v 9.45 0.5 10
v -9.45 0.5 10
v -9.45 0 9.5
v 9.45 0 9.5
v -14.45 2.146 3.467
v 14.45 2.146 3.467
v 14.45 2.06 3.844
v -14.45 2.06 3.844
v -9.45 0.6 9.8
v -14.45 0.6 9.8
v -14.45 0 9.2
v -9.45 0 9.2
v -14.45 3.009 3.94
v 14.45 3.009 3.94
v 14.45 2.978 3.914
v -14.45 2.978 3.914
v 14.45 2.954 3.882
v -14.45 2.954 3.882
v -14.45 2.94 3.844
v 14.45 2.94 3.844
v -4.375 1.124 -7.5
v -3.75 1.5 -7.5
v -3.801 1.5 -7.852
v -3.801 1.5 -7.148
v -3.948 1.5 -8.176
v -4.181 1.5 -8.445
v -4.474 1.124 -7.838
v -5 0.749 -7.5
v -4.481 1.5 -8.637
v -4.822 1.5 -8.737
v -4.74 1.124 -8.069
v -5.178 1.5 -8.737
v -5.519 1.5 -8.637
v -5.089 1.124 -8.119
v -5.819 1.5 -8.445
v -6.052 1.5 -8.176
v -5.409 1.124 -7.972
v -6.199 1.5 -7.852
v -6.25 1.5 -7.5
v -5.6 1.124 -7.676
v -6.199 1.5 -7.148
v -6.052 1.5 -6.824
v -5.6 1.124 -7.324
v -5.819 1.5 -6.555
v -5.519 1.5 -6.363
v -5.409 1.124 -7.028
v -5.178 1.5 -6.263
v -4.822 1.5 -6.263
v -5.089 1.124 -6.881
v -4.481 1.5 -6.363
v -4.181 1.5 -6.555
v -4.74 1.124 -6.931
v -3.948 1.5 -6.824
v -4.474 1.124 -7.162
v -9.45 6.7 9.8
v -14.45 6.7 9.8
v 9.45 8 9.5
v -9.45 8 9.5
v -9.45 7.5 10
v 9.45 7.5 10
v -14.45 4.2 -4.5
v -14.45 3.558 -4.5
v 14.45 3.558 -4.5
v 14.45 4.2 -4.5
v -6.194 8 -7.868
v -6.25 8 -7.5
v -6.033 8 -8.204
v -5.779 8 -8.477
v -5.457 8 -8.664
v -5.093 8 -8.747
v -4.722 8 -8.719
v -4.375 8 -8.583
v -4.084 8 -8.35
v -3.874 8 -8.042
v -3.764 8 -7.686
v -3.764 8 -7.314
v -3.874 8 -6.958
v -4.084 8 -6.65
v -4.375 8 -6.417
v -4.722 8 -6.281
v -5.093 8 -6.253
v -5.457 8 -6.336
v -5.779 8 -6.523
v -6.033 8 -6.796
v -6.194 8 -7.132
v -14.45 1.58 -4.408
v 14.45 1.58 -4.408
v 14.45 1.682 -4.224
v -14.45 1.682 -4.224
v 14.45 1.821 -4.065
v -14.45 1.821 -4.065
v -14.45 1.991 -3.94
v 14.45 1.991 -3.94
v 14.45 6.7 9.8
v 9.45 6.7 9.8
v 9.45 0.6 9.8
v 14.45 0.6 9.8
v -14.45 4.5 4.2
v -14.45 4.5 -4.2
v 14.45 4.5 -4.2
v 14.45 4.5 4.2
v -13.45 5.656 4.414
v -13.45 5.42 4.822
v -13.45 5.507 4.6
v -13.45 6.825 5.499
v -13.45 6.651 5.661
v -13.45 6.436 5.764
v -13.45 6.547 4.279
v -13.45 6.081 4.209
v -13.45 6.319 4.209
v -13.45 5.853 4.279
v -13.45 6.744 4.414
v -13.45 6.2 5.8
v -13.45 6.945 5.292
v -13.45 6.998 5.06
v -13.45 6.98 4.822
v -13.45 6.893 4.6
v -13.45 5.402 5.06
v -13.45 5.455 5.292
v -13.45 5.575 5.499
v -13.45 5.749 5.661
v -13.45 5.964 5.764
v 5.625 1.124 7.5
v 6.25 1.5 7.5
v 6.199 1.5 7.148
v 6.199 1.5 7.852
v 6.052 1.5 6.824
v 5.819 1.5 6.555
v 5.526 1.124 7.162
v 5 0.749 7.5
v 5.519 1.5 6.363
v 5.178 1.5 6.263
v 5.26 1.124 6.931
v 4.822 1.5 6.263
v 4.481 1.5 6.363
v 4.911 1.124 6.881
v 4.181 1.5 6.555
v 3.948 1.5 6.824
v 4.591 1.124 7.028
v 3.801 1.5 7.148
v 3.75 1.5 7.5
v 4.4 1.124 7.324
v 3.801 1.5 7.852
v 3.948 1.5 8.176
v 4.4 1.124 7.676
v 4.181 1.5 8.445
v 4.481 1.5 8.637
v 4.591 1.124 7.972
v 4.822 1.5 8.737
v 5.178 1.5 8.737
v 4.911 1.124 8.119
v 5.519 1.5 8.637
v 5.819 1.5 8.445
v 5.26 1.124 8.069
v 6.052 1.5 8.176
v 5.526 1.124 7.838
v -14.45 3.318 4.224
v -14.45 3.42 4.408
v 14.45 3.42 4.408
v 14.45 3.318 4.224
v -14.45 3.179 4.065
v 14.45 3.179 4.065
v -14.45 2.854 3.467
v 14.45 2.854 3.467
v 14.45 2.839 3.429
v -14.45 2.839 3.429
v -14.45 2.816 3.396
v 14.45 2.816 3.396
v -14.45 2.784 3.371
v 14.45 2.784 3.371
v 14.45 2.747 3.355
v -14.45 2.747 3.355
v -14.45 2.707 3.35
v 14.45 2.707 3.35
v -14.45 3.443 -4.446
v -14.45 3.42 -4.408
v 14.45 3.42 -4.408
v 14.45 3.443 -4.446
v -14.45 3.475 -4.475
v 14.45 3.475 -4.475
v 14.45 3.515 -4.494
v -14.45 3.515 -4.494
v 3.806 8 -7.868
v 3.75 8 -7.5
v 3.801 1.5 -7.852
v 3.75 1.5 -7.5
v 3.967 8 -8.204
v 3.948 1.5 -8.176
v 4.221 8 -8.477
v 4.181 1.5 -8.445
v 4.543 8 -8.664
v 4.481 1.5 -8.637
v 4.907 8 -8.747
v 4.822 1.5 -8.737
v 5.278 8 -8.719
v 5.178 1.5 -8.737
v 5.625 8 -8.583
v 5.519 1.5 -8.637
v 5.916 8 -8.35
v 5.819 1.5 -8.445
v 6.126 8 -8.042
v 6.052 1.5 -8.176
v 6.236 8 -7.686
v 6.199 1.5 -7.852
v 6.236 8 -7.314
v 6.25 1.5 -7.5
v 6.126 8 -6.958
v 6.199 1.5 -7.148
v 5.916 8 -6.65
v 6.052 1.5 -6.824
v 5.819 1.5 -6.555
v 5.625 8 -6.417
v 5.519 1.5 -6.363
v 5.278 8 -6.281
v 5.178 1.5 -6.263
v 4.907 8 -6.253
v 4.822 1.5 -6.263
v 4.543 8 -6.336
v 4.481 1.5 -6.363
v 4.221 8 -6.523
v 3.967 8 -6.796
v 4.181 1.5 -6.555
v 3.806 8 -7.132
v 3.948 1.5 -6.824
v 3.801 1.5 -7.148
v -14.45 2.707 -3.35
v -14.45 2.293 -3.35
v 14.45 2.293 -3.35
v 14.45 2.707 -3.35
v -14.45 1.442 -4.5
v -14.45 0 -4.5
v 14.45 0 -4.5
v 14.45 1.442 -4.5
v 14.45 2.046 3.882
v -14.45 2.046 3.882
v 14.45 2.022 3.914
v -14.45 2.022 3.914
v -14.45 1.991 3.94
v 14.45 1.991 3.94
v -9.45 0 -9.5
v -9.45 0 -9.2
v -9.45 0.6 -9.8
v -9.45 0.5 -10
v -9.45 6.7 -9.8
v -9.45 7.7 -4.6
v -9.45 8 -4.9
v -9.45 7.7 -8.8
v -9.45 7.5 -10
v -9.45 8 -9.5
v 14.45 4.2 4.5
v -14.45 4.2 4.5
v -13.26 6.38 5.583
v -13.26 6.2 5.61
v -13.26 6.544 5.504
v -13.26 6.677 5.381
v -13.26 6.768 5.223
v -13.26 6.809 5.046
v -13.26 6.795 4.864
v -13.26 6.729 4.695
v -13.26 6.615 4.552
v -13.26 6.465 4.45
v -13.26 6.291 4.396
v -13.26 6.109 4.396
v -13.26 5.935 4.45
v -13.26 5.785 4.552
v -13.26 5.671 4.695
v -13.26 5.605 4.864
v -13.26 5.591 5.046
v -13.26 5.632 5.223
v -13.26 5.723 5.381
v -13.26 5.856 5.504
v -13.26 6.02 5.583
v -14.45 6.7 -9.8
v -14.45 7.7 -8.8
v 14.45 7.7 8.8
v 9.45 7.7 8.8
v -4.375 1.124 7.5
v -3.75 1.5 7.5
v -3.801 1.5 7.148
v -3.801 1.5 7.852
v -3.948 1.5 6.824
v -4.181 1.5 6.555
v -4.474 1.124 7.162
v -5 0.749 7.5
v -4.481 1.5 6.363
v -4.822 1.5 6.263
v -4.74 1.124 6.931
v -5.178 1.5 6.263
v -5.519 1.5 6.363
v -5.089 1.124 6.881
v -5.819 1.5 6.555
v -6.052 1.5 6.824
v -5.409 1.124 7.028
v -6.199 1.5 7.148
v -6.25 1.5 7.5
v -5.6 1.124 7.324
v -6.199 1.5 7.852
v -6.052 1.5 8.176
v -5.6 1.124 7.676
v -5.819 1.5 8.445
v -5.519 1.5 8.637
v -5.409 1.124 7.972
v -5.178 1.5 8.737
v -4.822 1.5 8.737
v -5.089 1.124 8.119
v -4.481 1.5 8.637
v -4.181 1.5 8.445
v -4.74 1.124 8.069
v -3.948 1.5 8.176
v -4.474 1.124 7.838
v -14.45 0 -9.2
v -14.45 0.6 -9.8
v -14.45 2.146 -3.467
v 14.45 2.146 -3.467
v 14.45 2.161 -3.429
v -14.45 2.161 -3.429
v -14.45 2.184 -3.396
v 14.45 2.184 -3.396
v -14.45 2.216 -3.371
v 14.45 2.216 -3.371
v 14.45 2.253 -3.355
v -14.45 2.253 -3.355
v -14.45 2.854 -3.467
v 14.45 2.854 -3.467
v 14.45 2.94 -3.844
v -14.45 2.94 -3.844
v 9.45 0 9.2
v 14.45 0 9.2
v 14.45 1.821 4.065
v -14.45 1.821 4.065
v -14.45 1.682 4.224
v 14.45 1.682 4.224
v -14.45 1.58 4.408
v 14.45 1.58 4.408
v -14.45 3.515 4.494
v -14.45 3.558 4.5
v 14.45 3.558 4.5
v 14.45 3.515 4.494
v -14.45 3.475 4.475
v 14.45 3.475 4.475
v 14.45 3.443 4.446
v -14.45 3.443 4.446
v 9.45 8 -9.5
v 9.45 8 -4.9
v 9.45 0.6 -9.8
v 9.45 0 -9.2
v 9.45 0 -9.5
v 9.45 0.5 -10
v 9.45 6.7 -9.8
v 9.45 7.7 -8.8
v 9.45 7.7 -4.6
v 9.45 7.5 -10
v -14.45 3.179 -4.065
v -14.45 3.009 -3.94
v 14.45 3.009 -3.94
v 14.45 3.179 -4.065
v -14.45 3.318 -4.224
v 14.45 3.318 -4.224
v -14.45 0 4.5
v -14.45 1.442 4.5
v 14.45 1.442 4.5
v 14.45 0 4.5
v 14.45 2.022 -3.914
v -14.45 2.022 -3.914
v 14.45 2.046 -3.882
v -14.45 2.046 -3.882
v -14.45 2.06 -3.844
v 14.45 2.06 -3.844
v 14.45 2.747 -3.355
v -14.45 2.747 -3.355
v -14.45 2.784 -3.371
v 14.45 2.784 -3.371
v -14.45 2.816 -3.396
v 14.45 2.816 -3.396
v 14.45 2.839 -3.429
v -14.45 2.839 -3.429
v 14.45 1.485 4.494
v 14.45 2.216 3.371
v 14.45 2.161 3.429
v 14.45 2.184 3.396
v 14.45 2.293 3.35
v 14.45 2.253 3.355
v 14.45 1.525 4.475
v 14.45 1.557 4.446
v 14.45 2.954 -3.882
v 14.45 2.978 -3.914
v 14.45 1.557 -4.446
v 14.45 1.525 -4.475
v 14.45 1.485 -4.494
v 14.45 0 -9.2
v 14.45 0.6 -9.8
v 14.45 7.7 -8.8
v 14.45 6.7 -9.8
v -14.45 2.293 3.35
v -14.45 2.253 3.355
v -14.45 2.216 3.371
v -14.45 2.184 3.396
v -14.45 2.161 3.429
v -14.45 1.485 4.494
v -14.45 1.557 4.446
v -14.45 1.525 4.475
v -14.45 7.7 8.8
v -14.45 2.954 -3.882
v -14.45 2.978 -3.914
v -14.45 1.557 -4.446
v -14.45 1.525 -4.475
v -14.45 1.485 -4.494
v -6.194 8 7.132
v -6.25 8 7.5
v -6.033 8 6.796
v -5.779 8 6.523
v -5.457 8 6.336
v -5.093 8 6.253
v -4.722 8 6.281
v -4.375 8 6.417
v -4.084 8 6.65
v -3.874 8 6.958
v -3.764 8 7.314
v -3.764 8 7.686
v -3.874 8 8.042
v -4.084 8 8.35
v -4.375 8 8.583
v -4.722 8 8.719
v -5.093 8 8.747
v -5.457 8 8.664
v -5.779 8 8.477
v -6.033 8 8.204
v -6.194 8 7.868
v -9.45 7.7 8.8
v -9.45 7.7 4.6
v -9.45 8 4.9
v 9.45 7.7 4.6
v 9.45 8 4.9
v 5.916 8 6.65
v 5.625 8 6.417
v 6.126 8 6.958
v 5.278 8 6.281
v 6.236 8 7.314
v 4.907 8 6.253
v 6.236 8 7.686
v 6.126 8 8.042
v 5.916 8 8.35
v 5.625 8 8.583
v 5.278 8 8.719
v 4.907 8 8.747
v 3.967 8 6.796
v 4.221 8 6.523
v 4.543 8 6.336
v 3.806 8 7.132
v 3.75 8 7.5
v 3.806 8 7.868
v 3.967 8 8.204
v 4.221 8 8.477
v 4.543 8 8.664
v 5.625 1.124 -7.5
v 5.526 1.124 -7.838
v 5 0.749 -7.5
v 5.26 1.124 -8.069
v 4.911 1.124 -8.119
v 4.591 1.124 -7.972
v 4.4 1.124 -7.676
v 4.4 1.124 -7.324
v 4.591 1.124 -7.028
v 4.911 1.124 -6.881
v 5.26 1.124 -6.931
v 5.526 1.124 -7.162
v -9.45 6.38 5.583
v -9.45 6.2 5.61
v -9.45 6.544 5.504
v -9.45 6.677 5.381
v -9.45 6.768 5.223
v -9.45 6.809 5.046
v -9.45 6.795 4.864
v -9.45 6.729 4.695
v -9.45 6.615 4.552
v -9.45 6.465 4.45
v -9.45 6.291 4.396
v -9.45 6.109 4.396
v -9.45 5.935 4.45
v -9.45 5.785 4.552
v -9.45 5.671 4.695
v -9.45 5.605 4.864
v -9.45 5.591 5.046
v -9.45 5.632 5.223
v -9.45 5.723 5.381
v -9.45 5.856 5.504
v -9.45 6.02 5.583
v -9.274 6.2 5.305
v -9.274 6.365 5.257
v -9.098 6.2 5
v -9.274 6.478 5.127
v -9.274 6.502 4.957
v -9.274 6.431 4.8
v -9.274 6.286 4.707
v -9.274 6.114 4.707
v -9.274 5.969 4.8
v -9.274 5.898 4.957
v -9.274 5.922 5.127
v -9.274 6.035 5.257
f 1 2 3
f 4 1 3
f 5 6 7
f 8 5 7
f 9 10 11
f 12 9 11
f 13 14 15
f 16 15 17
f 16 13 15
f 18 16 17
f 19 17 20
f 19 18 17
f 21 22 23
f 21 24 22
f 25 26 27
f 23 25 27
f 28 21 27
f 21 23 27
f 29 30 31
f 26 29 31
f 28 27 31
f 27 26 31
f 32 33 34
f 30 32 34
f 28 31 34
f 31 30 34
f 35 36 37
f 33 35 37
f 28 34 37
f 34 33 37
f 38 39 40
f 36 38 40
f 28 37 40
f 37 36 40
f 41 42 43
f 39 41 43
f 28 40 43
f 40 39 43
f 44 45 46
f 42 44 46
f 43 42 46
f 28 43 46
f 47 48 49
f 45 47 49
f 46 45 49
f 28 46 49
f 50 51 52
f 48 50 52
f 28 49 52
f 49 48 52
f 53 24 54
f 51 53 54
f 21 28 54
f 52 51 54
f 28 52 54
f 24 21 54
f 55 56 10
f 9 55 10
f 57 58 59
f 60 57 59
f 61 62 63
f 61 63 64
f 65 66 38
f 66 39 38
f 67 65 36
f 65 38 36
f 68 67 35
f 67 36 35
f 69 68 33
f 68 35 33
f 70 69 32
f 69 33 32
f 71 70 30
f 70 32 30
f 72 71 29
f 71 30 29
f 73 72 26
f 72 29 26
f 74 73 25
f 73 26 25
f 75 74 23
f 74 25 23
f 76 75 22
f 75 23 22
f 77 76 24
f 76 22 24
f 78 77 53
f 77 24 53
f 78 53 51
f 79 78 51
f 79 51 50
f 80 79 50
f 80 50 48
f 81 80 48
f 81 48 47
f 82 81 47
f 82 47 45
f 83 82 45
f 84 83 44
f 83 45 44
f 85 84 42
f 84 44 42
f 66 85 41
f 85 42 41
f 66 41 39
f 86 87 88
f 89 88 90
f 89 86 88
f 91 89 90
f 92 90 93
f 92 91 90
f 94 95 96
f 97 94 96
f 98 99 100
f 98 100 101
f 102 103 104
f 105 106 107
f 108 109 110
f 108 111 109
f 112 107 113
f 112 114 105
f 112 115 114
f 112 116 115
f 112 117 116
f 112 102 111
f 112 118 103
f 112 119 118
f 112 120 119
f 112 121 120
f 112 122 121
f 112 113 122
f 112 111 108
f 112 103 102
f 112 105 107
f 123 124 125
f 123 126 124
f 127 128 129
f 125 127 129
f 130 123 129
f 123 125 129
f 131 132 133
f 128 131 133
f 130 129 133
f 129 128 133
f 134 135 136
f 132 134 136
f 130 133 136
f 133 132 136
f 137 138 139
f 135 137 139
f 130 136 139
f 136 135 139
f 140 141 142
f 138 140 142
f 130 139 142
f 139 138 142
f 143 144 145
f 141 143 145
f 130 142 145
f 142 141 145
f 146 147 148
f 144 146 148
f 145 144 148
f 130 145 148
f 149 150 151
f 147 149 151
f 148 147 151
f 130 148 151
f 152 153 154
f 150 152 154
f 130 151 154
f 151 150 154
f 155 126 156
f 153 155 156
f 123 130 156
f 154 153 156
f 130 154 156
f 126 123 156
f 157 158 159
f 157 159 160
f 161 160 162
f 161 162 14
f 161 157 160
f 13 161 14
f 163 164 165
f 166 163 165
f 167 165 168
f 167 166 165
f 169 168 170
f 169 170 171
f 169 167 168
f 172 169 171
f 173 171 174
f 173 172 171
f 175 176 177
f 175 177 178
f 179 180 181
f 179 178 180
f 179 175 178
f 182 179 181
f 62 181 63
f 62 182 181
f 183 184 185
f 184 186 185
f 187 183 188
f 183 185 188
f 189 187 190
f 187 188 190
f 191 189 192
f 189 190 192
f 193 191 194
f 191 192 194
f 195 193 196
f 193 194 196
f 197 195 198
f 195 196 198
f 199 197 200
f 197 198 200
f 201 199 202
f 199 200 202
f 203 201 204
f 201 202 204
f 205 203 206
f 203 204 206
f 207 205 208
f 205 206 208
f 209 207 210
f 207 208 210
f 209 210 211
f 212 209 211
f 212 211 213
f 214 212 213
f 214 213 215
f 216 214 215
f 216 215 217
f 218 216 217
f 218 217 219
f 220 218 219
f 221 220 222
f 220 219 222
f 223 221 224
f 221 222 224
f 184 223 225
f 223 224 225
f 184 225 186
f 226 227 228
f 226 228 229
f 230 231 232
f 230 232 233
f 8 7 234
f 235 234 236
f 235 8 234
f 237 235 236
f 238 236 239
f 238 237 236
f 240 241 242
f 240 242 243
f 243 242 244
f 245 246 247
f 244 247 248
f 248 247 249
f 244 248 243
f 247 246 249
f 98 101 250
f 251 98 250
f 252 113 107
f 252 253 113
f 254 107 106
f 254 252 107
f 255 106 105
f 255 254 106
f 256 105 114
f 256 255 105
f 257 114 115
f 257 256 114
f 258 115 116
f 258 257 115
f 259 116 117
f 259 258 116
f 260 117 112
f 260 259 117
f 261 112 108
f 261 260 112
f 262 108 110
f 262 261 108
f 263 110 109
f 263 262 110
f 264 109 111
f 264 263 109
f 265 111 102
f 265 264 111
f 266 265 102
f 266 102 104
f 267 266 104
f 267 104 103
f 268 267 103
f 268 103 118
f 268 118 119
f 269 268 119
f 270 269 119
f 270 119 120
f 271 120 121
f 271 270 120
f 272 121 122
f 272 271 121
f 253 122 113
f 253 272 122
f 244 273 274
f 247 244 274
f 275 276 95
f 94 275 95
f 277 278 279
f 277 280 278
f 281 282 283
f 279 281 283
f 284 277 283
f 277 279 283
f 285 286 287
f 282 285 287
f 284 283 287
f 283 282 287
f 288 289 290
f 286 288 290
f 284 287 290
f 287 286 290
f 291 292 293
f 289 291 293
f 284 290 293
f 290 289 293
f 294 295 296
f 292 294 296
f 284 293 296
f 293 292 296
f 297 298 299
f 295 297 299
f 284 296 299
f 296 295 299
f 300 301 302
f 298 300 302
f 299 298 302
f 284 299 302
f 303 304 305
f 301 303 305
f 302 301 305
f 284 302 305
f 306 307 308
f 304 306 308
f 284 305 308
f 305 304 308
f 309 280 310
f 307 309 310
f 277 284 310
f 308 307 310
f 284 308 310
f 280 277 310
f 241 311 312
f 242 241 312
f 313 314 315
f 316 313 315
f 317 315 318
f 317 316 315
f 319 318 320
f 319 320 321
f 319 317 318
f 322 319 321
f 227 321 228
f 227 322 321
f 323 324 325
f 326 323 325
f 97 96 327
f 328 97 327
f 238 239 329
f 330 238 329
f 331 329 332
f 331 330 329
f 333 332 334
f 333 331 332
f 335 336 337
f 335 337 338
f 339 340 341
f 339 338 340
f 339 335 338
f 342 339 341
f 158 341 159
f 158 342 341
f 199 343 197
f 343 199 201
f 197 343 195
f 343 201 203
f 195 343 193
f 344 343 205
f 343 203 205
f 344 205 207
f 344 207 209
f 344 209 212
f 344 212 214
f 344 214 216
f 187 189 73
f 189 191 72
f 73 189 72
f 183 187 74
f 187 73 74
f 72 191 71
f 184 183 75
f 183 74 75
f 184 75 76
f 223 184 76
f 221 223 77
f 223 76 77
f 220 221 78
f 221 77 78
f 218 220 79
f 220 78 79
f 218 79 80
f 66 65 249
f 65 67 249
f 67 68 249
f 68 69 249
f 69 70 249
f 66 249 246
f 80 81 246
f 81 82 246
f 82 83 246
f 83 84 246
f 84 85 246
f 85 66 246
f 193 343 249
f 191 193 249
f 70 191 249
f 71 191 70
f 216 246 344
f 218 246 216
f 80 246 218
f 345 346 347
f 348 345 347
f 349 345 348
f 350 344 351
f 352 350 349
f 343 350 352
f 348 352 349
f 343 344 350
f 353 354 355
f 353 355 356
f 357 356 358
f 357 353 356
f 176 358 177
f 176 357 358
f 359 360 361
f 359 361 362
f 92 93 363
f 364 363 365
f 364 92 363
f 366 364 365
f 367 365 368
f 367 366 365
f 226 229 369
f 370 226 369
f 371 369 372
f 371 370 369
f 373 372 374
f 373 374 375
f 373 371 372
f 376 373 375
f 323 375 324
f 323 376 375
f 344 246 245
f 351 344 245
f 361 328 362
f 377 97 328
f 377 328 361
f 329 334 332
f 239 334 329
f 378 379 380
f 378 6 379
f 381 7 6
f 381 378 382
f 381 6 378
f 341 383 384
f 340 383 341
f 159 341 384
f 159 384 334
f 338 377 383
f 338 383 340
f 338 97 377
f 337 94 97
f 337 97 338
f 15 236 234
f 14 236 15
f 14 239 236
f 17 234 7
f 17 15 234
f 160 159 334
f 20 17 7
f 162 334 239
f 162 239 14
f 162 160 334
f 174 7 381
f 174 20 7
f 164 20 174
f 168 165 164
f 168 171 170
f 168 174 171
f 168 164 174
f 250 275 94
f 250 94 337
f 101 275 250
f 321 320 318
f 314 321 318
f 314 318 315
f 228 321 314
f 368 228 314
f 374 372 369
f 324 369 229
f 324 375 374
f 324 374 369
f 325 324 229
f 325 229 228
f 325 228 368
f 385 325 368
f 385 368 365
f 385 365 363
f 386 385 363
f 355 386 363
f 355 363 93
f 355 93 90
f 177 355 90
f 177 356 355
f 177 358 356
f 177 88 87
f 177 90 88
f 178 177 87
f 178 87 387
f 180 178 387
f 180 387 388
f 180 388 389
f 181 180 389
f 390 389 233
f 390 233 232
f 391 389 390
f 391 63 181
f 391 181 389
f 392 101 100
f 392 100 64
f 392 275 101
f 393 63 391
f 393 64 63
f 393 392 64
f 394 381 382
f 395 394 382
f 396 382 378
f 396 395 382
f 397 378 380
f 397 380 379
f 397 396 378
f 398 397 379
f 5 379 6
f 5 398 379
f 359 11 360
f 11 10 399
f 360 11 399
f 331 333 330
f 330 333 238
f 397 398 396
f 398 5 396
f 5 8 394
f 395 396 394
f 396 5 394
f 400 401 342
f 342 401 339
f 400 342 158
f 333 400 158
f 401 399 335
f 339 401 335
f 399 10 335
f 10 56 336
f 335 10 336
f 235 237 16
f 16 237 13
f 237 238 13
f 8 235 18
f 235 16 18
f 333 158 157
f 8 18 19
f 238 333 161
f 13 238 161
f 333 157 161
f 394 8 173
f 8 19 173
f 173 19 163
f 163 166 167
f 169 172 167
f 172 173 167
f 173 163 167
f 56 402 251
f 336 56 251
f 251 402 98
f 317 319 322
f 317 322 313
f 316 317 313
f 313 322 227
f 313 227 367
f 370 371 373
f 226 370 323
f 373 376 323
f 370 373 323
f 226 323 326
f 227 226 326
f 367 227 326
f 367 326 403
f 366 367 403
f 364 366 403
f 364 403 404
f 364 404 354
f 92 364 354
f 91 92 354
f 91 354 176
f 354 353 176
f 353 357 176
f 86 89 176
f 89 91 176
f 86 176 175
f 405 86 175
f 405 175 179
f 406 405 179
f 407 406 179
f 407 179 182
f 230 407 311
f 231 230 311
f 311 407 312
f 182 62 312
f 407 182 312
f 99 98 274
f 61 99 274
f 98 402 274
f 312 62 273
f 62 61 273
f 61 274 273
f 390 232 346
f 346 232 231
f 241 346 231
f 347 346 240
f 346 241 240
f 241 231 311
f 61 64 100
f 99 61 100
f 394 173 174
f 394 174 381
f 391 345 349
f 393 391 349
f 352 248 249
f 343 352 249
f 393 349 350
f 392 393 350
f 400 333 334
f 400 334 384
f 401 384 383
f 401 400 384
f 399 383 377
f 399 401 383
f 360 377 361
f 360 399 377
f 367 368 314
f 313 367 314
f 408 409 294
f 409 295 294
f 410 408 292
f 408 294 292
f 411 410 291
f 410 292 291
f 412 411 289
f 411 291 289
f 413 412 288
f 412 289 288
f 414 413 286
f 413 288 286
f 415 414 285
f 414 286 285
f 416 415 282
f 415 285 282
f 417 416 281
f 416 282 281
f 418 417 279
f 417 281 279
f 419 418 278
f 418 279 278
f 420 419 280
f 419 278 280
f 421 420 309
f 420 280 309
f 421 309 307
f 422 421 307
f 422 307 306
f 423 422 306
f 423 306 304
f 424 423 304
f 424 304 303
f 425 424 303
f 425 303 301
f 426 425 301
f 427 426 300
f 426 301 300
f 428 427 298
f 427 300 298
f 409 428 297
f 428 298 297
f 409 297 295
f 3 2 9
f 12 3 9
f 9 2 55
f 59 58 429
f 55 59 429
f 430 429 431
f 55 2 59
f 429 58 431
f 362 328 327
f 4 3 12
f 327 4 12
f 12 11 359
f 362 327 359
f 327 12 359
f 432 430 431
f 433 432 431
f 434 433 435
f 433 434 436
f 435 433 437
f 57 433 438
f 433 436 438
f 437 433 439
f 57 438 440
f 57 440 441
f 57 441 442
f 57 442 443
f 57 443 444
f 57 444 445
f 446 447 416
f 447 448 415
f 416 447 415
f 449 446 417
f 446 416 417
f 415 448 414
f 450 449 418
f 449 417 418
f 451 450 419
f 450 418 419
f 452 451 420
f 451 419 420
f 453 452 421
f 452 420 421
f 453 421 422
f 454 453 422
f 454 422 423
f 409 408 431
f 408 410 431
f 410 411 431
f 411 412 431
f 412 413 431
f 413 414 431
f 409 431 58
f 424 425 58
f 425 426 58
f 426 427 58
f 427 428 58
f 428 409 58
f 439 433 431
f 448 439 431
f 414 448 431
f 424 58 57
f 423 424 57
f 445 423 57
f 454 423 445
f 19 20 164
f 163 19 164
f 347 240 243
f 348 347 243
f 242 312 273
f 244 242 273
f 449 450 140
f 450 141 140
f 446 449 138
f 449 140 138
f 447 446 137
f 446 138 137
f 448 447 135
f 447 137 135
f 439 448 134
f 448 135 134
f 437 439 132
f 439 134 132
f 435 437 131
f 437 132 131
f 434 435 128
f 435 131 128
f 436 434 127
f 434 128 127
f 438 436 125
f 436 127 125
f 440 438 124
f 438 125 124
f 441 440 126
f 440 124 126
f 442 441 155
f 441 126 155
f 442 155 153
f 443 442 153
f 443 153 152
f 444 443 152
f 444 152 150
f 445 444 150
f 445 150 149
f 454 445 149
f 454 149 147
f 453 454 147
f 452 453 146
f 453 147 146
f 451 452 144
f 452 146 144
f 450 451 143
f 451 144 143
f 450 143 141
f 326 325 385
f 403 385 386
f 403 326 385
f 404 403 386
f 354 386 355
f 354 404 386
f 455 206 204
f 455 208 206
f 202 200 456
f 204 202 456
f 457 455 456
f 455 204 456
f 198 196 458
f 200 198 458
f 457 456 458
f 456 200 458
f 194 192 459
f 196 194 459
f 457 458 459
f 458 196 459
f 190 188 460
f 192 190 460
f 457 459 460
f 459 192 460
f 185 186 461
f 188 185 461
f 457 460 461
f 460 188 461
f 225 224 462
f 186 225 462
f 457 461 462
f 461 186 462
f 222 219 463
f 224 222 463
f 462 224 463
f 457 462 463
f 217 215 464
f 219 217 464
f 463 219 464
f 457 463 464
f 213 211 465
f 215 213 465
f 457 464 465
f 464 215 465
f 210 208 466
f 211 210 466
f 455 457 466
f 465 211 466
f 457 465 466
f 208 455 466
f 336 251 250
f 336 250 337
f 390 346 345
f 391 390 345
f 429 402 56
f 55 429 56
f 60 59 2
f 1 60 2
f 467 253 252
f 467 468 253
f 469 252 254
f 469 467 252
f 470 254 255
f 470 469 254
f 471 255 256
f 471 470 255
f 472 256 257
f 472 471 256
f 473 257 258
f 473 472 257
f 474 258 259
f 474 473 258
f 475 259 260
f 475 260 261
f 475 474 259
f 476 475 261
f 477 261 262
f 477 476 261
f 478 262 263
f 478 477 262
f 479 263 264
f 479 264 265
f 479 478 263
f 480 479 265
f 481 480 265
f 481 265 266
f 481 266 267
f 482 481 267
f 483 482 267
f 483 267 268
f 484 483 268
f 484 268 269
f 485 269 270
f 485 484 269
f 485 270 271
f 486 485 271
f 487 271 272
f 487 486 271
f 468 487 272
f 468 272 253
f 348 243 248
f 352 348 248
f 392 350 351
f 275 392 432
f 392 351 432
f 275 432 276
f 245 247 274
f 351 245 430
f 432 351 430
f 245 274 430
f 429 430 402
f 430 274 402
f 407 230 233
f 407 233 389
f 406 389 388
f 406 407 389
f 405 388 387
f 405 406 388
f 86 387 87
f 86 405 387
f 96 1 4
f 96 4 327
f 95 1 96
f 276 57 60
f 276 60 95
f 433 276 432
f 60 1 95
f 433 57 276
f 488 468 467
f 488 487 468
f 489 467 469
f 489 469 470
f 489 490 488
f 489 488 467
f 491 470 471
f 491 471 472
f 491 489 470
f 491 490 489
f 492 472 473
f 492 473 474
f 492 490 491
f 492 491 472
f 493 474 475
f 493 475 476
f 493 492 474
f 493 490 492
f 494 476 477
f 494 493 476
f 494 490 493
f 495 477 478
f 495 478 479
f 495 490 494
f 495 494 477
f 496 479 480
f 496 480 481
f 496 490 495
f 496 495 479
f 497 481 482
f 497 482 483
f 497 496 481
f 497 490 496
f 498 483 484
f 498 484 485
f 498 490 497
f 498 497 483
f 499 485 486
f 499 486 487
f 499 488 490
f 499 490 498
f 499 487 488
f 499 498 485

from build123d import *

# Parameters (mm, degrees)
EXTRUDE_1_DEPTH          = 9.45
EXTRUDE_1_DEPTH_BACK     = 9.45
EXTRUDE_2_DEPTH          = 14.45
EXTRUDE_2_DEPTH_BACK     = 14.45
CUT_EXTRUDE_1_DEPTH      = 24.45
CUT_EXTRUDE_1_DEPTH_BACK = 26.45
HOLE_WIZARD_M3_1_D       = 2.5
HOLE_WIZARD_M3_1_DEPTH   = 6.5
HOLE_WIZARD_M3_1_TIP     = 0.751075774


with BuildPart() as part:
    # 草图1 → 凸台-拉伸1 (new, two sides: drawn at the far end of the back side and taken through both)
    with BuildSketch(Plane(origin=(0, 0, 0), x_dir=(0, 0, -1), z_dir=(1, 0, 0)).offset(-EXTRUDE_1_DEPTH_BACK)):
        Polygon((-10, 7.500004795), (-10, 0.499995205), (-9.500004795, 0), (9.500004795, 0), (10, 0.499995205), (10, 7.500004795), (9.500004795, 8), (4.9, 8), (4.6, 7.7), (-4.6, 7.7), (-4.9, 8), (-9.500004795, 8), align=None)
    extrude(amount=EXTRUDE_1_DEPTH + EXTRUDE_1_DEPTH_BACK)

    # 草图2 → 凸台-拉伸2 (add, two sides: drawn at the far end of the back side and taken through both)
    with BuildSketch(Plane(origin=(0, 0, 0), x_dir=(0, 0, -1), z_dir=(1, 0, 0)).offset(-EXTRUDE_2_DEPTH_BACK)):
        Polygon((-9.8, 6.70000959), (-9.8, 0.599980104), (-9.200019896, 0), (9.200019896, 0), (9.8, 0.599980104), (9.8, 6.70000959), (8.80000959, 7.7), (-8.80000959, 7.7), align=None)
    extrude(amount=EXTRUDE_2_DEPTH + EXTRUDE_2_DEPTH_BACK)

    # 草图3 → 切除-拉伸1 (cut, two sides: drawn at the far end of the back side and taken through both)
    with BuildSketch(Plane(origin=(0, 0, 0), x_dir=(0, 0, -1), z_dir=(1, 0, 0)).offset(-CUT_EXTRUDE_1_DEPTH_BACK)):
        with BuildLine():
            Line((-4.5, 4.199974593), (-4.5, 3.5583))
            ThreePointArc((-4.5, 3.5583), (-4.475010695, 3.475400506), (-4.408368985, 3.420122355))
            ThreePointArc((-4.408368985, 3.420122355), (-4.141124334, 3.252255308), (-3.93950231, 3.009464023))
            ThreePointArc((-3.93950231, 3.009464023), (-3.898814145, 2.964704671), (-3.843755349, 2.939655613))
            Line((-3.843755349, 2.939655613), (-3.466644651, 2.853644387))
            ThreePointArc((-3.466644651, 2.853644387), (-3.382732565, 2.800932608), (-3.35, 2.7074))
            Line((-3.35, 2.7074), (-3.35, 2.2926))
            ThreePointArc((-3.35, 2.2926), (-3.382732565, 2.199067392), (-3.466644651, 2.146355613))
            Line((-3.466644651, 2.146355613), (-3.843755349, 2.060344387))
            ThreePointArc((-3.843755349, 2.060344387), (-3.898814145, 2.035295329), (-3.93950231, 1.990535977))
            ThreePointArc((-3.93950231, 1.990535977), (-4.141123452, 1.74774336), (-4.408368985, 1.579877645))
            ThreePointArc((-4.408368985, 1.579877645), (-4.475010695, 1.524599494), (-4.5, 1.4417))
            Line((-4.5, 1.4417), (-4.5, -1.500004795))
            Line((-4.5, -1.500004795), (-4.000004795, -2))
            Line((-4.000004795, -2), (1.4, -2))
            ThreePointArc((1.4, -2), (1.8, -1.8), (2.2, -2))
            Line((2.2, -2), (4.000004795, -2))
            Line((4.000004795, -2), (4.5, -1.500004795))
            Line((4.5, -1.500004795), (4.5, 1.4417))
            ThreePointArc((4.5, 1.4417), (4.475010695, 1.524599494), (4.408368985, 1.579877645))
            ThreePointArc((4.408368985, 1.579877645), (4.141124334, 1.747744692), (3.93950231, 1.990535977))
            ThreePointArc((3.93950231, 1.990535977), (3.898814145, 2.035295329), (3.843755349, 2.060344387))
            Line((3.843755349, 2.060344387), (3.466644651, 2.146355613))
            ThreePointArc((3.466644651, 2.146355613), (3.382732565, 2.199067392), (3.35, 2.2926))
            Line((3.35, 2.2926), (3.35, 2.7074))
            ThreePointArc((3.35, 2.7074), (3.382732565, 2.800932608), (3.466644651, 2.853644387))
            Line((3.466644651, 2.853644387), (3.843755349, 2.939655613))
            ThreePointArc((3.843755349, 2.939655613), (3.898814145, 2.964704671), (3.93950231, 3.009464023))
            ThreePointArc((3.93950231, 3.009464023), (4.141123452, 3.25225664), (4.408368985, 3.420122355))
            ThreePointArc((4.408368985, 3.420122355), (4.475010695, 3.475400506), (4.5, 3.5583))
            Line((4.5, 3.5583), (4.5, 4.199974593))
            Line((4.5, 4.199974593), (4.199974593, 4.5))
            Line((4.199974593, 4.5), (-4.199974593, 4.5))
            Line((-4.199974593, 4.5), (-4.5, 4.199974593))
        make_face()
    extrude(amount=CUT_EXTRUDE_1_DEPTH + CUT_EXTRUDE_1_DEPTH_BACK, mode=Mode.SUBTRACT)

    # 草图12 → 切除-旋转6 (revolve, cut)
    with BuildSketch(Plane.XY.offset(5)):
        Polygon((-13.45, 6.2), (-13.45, 7), (-13.2605, 6.8105), (-9.45, 6.8105), (-9.097527661, 6.2), align=None)
    revolve(axis=Axis((-9.097527661, 6.2, 5), (-1, 0, 0)), mode=Mode.SUBTRACT)

    # M3 螺纹孔1
    with Locations(Plane(origin=(0, 8, 0), x_dir=(1, 0, 0), z_dir=(0, 1, 0))):
        with Locations((5, -7.5), (-5, -7.5), (5, 7.5), (-5, 7.5)):
            Hole(HOLE_WIZARD_M3_1_D / 2, depth=HOLE_WIZARD_M3_1_DEPTH)
            with Locations((0, 0, -(HOLE_WIZARD_M3_1_DEPTH + HOLE_WIZARD_M3_1_TIP / 2))):  # 118° drill point
                Cone(0, HOLE_WIZARD_M3_1_D / 2, HOLE_WIZARD_M3_1_TIP, mode=Mode.SUBTRACT)


solid = part.part
